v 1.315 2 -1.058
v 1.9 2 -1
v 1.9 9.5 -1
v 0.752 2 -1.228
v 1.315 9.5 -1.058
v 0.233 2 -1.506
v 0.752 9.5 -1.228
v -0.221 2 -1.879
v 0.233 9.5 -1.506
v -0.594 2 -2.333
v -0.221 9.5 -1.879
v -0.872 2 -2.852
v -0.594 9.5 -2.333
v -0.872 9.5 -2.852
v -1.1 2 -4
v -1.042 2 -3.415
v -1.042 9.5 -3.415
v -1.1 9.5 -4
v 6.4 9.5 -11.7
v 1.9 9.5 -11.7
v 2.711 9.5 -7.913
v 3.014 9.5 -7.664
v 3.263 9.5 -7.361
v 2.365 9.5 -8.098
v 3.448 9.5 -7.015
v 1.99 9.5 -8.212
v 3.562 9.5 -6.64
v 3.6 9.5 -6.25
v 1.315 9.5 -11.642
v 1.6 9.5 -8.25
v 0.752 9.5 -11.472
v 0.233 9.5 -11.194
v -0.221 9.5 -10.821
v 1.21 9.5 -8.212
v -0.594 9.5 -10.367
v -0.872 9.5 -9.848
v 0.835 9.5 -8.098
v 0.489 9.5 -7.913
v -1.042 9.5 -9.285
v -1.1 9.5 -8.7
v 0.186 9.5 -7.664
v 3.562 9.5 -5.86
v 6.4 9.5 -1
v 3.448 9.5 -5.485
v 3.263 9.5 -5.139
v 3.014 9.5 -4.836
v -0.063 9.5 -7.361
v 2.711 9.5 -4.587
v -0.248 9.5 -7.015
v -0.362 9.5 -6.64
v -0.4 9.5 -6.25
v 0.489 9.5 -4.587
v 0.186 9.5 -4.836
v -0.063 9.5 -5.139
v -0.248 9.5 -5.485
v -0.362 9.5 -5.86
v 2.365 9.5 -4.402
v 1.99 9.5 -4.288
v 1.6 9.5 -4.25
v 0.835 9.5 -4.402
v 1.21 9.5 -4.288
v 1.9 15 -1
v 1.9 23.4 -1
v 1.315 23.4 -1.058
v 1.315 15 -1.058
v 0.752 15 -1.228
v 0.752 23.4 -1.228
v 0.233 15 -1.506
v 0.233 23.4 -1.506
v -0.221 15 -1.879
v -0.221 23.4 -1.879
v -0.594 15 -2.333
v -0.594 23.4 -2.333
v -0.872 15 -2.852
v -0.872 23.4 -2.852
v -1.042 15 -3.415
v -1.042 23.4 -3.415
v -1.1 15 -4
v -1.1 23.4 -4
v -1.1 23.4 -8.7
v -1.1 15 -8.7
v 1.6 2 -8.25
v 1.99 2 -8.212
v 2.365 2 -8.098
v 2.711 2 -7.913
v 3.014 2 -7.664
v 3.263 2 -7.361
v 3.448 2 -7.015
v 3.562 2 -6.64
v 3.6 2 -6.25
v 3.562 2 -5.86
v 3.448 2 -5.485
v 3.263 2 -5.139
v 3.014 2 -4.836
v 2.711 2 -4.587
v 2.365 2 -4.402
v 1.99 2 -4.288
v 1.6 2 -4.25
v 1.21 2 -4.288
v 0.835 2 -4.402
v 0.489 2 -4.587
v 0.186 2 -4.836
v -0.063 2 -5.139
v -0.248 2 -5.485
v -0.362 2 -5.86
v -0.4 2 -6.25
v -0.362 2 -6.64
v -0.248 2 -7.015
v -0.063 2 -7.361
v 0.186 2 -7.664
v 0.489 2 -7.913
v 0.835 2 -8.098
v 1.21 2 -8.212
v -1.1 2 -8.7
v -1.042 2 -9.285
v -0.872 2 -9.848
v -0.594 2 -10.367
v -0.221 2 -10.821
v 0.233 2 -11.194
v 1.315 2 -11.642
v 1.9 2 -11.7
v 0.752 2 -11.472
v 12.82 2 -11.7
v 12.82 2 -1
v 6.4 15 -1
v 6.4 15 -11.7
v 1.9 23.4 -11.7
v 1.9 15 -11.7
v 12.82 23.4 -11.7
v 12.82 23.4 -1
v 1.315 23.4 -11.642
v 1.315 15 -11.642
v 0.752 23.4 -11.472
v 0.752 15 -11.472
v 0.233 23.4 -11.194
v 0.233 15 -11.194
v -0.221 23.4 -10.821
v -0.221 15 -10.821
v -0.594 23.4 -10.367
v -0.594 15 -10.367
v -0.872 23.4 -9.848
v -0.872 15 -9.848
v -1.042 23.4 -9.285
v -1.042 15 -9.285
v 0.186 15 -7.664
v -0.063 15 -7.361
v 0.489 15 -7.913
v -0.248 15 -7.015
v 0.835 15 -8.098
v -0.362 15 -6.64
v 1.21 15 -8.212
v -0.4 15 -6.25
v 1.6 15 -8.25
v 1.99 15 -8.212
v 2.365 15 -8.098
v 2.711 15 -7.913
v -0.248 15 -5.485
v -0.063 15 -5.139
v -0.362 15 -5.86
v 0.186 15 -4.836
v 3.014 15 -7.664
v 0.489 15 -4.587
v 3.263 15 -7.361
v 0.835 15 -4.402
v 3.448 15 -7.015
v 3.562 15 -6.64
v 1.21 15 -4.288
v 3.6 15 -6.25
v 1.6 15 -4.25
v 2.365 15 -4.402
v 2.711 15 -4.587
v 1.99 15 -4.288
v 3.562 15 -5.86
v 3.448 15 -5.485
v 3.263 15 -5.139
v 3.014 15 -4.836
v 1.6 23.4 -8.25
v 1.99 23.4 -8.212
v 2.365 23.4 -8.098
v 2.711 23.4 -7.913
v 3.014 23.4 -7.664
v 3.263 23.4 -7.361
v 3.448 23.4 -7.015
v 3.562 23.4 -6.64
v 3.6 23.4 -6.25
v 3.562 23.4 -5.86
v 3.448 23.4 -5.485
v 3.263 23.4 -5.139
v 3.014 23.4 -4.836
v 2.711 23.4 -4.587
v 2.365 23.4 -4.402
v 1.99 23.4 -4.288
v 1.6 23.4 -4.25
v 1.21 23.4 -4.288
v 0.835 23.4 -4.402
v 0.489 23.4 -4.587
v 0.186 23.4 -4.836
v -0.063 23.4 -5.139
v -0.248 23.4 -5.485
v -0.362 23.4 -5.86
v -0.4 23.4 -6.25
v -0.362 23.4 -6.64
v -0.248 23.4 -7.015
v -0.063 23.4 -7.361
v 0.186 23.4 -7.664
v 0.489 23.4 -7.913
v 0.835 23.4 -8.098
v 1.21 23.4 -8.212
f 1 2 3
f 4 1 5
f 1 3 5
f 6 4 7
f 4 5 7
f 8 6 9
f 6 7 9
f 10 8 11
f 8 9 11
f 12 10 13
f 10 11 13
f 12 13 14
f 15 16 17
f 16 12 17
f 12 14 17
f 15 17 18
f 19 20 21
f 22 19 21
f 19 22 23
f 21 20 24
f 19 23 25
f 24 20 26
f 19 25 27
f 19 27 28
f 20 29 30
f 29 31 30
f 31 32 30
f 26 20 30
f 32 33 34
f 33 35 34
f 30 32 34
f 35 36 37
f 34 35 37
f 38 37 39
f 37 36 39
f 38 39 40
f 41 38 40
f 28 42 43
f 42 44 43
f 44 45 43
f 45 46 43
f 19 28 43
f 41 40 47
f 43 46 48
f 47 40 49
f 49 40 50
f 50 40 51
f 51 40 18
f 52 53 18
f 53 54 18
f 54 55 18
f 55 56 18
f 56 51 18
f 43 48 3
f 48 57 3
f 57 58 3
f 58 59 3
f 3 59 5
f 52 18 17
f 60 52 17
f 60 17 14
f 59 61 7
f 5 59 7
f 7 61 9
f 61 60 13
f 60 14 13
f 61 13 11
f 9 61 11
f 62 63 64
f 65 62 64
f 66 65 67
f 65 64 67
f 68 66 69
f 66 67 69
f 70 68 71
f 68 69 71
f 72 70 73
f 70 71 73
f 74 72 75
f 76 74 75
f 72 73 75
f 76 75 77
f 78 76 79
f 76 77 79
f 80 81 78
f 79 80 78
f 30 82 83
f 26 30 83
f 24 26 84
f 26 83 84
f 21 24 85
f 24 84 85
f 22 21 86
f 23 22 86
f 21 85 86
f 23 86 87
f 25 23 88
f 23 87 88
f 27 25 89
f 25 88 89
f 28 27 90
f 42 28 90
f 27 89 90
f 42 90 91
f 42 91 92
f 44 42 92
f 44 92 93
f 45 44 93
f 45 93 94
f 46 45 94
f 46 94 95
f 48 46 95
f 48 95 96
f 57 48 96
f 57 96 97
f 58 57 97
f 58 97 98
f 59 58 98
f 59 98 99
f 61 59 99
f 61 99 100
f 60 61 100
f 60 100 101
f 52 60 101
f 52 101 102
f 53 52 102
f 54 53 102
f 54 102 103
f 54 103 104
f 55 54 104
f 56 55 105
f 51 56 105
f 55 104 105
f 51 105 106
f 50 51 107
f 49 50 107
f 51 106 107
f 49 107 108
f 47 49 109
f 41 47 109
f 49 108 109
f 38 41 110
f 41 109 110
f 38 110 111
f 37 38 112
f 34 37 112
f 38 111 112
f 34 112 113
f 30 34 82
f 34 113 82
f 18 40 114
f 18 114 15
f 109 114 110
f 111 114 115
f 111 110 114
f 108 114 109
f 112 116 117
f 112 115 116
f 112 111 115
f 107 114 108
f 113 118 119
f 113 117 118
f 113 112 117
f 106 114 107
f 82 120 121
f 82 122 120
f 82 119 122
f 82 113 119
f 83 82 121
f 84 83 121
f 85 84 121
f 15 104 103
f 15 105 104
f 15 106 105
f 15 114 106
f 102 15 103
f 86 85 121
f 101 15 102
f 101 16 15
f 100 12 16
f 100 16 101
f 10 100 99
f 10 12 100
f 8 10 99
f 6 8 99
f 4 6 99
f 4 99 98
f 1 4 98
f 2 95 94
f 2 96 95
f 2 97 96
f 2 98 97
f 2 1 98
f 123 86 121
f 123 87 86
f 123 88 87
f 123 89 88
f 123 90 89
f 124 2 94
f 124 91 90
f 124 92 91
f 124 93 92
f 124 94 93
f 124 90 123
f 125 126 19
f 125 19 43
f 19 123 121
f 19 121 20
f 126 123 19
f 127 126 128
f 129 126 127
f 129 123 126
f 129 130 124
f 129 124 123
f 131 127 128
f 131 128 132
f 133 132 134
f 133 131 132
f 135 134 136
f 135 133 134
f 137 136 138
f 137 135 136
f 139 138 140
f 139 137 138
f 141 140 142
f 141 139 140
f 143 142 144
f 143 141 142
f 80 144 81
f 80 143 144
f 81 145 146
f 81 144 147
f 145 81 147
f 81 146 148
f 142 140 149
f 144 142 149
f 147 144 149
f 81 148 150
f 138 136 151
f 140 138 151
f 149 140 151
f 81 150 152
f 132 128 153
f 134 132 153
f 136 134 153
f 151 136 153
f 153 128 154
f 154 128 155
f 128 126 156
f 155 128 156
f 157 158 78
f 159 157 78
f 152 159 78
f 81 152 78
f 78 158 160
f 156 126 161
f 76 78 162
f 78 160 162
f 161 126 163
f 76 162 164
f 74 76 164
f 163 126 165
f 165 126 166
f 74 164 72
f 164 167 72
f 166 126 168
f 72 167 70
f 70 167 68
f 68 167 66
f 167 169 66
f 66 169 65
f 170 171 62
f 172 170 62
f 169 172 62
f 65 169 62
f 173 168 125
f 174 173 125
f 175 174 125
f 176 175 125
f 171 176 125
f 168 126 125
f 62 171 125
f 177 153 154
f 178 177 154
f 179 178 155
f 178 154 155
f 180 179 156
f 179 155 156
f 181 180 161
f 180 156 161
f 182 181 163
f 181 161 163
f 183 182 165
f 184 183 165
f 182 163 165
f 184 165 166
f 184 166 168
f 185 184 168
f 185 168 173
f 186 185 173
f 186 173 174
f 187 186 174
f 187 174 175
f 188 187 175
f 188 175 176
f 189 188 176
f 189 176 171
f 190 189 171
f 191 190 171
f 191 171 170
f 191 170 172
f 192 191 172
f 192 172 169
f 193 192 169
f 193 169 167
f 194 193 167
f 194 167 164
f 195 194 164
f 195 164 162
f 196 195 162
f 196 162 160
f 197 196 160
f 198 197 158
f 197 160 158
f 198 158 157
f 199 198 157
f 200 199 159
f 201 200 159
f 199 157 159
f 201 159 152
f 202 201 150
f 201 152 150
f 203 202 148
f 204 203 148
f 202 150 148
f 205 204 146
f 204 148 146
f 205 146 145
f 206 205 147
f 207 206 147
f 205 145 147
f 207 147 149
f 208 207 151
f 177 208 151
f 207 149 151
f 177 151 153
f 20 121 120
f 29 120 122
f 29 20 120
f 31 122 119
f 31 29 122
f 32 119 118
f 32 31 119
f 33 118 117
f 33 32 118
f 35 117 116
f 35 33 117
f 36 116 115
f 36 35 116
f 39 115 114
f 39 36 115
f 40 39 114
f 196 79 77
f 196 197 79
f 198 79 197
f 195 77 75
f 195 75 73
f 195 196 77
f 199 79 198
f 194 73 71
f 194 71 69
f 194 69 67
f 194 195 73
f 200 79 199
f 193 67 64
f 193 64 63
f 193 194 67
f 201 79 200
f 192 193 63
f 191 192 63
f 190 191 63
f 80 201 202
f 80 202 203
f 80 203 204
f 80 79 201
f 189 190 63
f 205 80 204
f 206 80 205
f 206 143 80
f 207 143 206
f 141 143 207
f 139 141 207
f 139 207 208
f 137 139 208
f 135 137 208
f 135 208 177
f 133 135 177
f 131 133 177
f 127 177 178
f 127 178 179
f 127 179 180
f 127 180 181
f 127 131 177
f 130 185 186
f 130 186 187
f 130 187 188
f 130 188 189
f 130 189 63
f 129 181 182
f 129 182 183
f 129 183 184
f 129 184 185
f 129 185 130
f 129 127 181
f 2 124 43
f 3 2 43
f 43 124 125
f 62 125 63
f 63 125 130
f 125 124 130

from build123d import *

# Parameters (mm, degrees)
BOSS_EXTRUDE4_DEPTH = 25.4
SKETCH3_R           = 2
CUT_EXTRUDE1_DEPTH  = 25.4
SKETCH5_W           = 54.299093249
SKETCH5_H           = 94.215662961
CUT_EXTRUDE2_DEPTH  = 4.5
SKETCH7_W           = 18.693193774
SKETCH7_H           = 5.5
CUT_EXTRUDE3_DEPTH  = 14.5
SKETCH9_W           = 36.111652001
SKETCH9_H           = 33.164105193
CUT_EXTRUDE4_DEPTH  = 1
SKETCH10_W          = 62.791660767
SKETCH10_H          = 37.243179947
CUT_EXTRUDE6_DEPTH  = 1
FILLET2_R           = 3
SKETCH11_W          = 10.7
SKETCH11_H          = 5.5
BOSS_EXTRUDE5_DEPTH = 2
SKETCH12_W          = 13.41826103
SKETCH12_H          = 56.552103836
CUT_EXTRUDE7_DEPTH  = 10
SKETCH14_W          = 10.7
SKETCH14_H          = 5.5
BOSS_EXTRUDE7_DEPTH = 2
SKETCH15_W          = 10.7
SKETCH15_H          = 9.5
BOSS_EXTRUDE8_DEPTH = 6
SKETCH16_W          = 10.7
SKETCH16_H          = 10.4
BOSS_EXTRUDE9_DEPTH = 6
FILLET3_R           = 3
SKETCH18_W          = 10.7
SKETCH18_H          = 5.5
CUT_EXTRUDE8_DEPTH  = 1
SKETCH21_W          = 35.797160714
SKETCH21_H          = 35.29022369
CUT_EXTRUDE9_DEPTH  = 3
SKETCH22_W          = 25.937316652
SKETCH22_H          = 36.458252548
CUT_EXTRUDE10_DEPTH = 2
SKETCH23_W          = 31.218703754
SKETCH23_H          = 37.872657663
CUT_EXTRUDE11_DEPTH = 2
SKETCH24_R          = 2
CUT_EXTRUDE12_DEPTH = 24


with BuildPart() as part:
    # Sketch1 → Boss-Extrude4 (new body)
    with BuildSketch(Plane(origin=(0, 0, 0), x_dir=(1, 0, 0), z_dir=(0, 1, 0))):
        with BuildLine():
            Line((0.717280831, 0), (0, 0))
            Line((0, 0), (0, 9.078373892))
            ThreePointArc((0, 9.078373892), (-0.063231401, 9.104565196), (-0.089422705, 9.167796597))
            Line((-0.089422705, 9.167796597), (-0.089422705, 9.317189397))
            ThreePointArc((-0.089422705, 9.317189397), (-0.063231401, 9.380420798), (0, 9.406612102))
            Line((0, 9.406612102), (0, 12.7))
            Line((0, 12.7), (0.98359831, 12.7))
            ThreePointArc((0.98359831, 12.7), (-3.239897706, 11.634417694), (-5.100024486, 7.695723417))
            Line((-5.100024486, 7.695723417), (-5.100024486, 5.049332428))
            ThreePointArc((-5.100024486, 5.049332428), (-3.343059972, 1.197813276), (0.717280831, 0))
        make_face()
        with BuildLine():
            Line((0, 9.078373892), (0, 0))
            Line((0, 0), (0.717280831, 0))
            ThreePointArc((0.717280831, 0), (3.851519152, 1.706272455), (5.100024486, 5.049332428))
            Line((5.100024486, 5.049332428), (5.100024486, 7.695723417))
            ThreePointArc((5.100024486, 7.695723417), (3.938694277, 10.935621123), (0.98359831, 12.7))
            Line((0.98359831, 12.7), (0, 12.7))
            Line((0, 12.7), (0, 9.406612102))
            ThreePointArc((0, 9.406612102), (0.063231401, 9.380420798), (0.089422705, 9.317189397))
            Line((0.089422705, 9.317189397), (0.089422705, 9.167796597))
            ThreePointArc((0.089422705, 9.167796597), (0.063231401, 9.104565196), (0, 9.078373892))
        make_face()
        with BuildLine():
            ThreePointArc((5.100024486, 5.049332428), (3.851519152, 1.706272455), (0.717280831, 0))
            Line((0.717280831, 0), (20.32, 0))
            Line((20.32, 0), (20.32, 12.7))
            Line((20.32, 12.7), (0.98359831, 12.7))
            ThreePointArc((0.98359831, 12.7), (3.938694277, 10.935621123), (5.100024486, 7.695723417))
            Line((5.100024486, 7.695723417), (5.100024486, 5.049332428))
        make_face()
    extrude(amount=BOSS_EXTRUDE4_DEPTH)

    # Sketch3 → Cut-Extrude1 (cut)
    with BuildSketch(Plane(origin=(0, 25.4, 0), x_dir=(1, 0, 0), z_dir=(0, 1, 0))):
        with Locations(Location((0, 6.163356084, 0), (0, 0, 270))):
            Circle(SKETCH3_R)
    extrude(amount=-CUT_EXTRUDE1_DEPTH, mode=Mode.SUBTRACT)

    # Sketch5 → Cut-Extrude2 (cut)
    with BuildSketch(Plane(origin=(20.32, 0, 0), x_dir=(0, 0, -1), z_dir=(1, 0, 0))):
        with Locations((11.125522758, -8.280714776)):
            Rectangle(SKETCH5_W, SKETCH5_H)
    extrude(amount=-CUT_EXTRUDE2_DEPTH, mode=Mode.SUBTRACT)

    # Sketch7 → Cut-Extrude3 (cut)
    with BuildSketch(Plane.ZY.offset(5.100024486)):
        with Locations((-6.318501351, 12.25)):
            Rectangle(SKETCH7_W, SKETCH7_H)
    extrude(amount=-CUT_EXTRUDE3_DEPTH, mode=Mode.SUBTRACT)

    # Sketch9 → Cut-Extrude4 (cut)
    with BuildSketch(Plane(origin=(0, 0, -12.7), x_dir=(-1, 0, 0), z_dir=(0, 0, -1))):
        with Locations((-4.511590843, 12.177462725)):
            Rectangle(SKETCH9_W, SKETCH9_H)
    extrude(amount=-CUT_EXTRUDE4_DEPTH, mode=Mode.SUBTRACT)


with BuildPart() as body_2:
    # of the pieces the cut leaves, the one that is kept (cut_extrude4_keep)
    add(part.part.solids().sort_by_distance((-0.089422705, 0, -9.167796597))[0])

    # Sketch10 → Cut-Extrude6 (cut)
    with BuildSketch(Plane.XY):
        with Locations((3.132657463, 10.976513171)):
            Rectangle(SKETCH10_W, SKETCH10_H)
    extrude(amount=-CUT_EXTRUDE6_DEPTH, mode=Mode.SUBTRACT)


with BuildPart() as body_2_2:
    # of the pieces the cut leaves, the one that is kept (cut_extrude6_keep)
    add(body_2.part.solids().sort_by_distance((-0.089422705, 0, -9.167796597))[0])

    # Fillet2
    fillet2_edges = [body_2_2.edges().sort_by_distance(p)[0] for p in [
        (-3.100509095, 20.2, -1),
        (-3.100509095, 4.75, -1),
        (-3.158483624, 4.75, -11.7),
        (-3.158483624, 20.2, -11.7),
    ]]
    fillet(fillet2_edges, radius=FILLET2_R)

    # Sketch11 → Boss-Extrude5 (add)
    with BuildSketch(Plane.ZY.offset(-9.399975514)):
        with Locations((-6.35, 12.25)):
            Rectangle(SKETCH11_W, SKETCH11_H)
    extrude(amount=BOSS_EXTRUDE5_DEPTH)

    # Sketch12 → Cut-Extrude7 (cut)
    with BuildSketch(Plane.ZY.offset(5.100024486)):
        with Locations((-6.709130515, 16.674143704)):
            Rectangle(SKETCH12_W, SKETCH12_H)
    extrude(amount=-CUT_EXTRUDE7_DEPTH, mode=Mode.SUBTRACT)

    # Sketch14 → Boss-Extrude7 (add)
    with BuildSketch(Plane.ZY.offset(-7.399975514)):
        with Locations((-6.35, 12.25)):
            Rectangle(SKETCH14_W, SKETCH14_H)
    extrude(amount=BOSS_EXTRUDE7_DEPTH)

    # Sketch15 → Boss-Extrude8 (add)
    with BuildSketch(Plane.ZY.offset(-4.899975514)):
        with Locations((-6.35, 4.75)):
            Rectangle(SKETCH15_W, SKETCH15_H)
    extrude(amount=BOSS_EXTRUDE8_DEPTH)

    # Sketch16 → Boss-Extrude9 (add)
    with BuildSketch(Plane.ZY.offset(-4.899975514)):
        with Locations((-6.35, 20.2)):
            Rectangle(SKETCH16_W, SKETCH16_H)
    extrude(amount=BOSS_EXTRUDE9_DEPTH)

    # Fillet3
    fillet3_edges = [body_2_2.edges().sort_by_distance(p)[0] for p in [
        (-1.100024486, 4.75, -11.7),
        (-1.100024486, 4.75, -1),
        (-1.100024486, 20.2, -11.7),
        (-1.100024486, 20.2, -1),
    ]]
    fillet(fillet3_edges, radius=FILLET3_R)

    # Sketch18 → Cut-Extrude8 (cut)
    with BuildSketch(Plane.ZY.offset(-5.399975514)):
        with Locations((-6.35, 12.25)):
            Rectangle(SKETCH18_W, SKETCH18_H)
    extrude(amount=-CUT_EXTRUDE8_DEPTH, mode=Mode.SUBTRACT)

    # Sketch21 → Cut-Extrude9 (cut)
    with BuildSketch(Plane(origin=(15.82, 0, 0), x_dir=(0, 0, -1), z_dir=(1, 0, 0))):
        with Locations((4.247356295, 13.050264646)):
            Rectangle(SKETCH21_W, SKETCH21_H)
    extrude(amount=-CUT_EXTRUDE9_DEPTH, mode=Mode.SUBTRACT)

    # Sketch22 → Cut-Extrude10 (cut)
    with BuildSketch(Plane(origin=(0, 25.4, 0), x_dir=(1, 0, 0), z_dir=(0, 1, 0))):
        with Locations((4.63538262, 4.299284276)):
            Rectangle(SKETCH22_W, SKETCH22_H)
    extrude(amount=-CUT_EXTRUDE10_DEPTH, mode=Mode.SUBTRACT)

    # Sketch23 → Cut-Extrude11 (cut)
    with BuildSketch(Plane.XZ):
        with Locations((9.360738883, -6.802201309)):
            Rectangle(SKETCH23_W, SKETCH23_H)
    extrude(amount=-CUT_EXTRUDE11_DEPTH, mode=Mode.SUBTRACT)

    # Sketch24 → Cut-Extrude12 (cut)
    with BuildSketch(Plane.XZ.offset(-2)):
        with Locations(Location((1.599975514, -6.25, 0), (0, 0, 270))):
            Circle(SKETCH24_R)
    extrude(amount=-CUT_EXTRUDE12_DEPTH, mode=Mode.SUBTRACT)


solid = body_2_2.part
